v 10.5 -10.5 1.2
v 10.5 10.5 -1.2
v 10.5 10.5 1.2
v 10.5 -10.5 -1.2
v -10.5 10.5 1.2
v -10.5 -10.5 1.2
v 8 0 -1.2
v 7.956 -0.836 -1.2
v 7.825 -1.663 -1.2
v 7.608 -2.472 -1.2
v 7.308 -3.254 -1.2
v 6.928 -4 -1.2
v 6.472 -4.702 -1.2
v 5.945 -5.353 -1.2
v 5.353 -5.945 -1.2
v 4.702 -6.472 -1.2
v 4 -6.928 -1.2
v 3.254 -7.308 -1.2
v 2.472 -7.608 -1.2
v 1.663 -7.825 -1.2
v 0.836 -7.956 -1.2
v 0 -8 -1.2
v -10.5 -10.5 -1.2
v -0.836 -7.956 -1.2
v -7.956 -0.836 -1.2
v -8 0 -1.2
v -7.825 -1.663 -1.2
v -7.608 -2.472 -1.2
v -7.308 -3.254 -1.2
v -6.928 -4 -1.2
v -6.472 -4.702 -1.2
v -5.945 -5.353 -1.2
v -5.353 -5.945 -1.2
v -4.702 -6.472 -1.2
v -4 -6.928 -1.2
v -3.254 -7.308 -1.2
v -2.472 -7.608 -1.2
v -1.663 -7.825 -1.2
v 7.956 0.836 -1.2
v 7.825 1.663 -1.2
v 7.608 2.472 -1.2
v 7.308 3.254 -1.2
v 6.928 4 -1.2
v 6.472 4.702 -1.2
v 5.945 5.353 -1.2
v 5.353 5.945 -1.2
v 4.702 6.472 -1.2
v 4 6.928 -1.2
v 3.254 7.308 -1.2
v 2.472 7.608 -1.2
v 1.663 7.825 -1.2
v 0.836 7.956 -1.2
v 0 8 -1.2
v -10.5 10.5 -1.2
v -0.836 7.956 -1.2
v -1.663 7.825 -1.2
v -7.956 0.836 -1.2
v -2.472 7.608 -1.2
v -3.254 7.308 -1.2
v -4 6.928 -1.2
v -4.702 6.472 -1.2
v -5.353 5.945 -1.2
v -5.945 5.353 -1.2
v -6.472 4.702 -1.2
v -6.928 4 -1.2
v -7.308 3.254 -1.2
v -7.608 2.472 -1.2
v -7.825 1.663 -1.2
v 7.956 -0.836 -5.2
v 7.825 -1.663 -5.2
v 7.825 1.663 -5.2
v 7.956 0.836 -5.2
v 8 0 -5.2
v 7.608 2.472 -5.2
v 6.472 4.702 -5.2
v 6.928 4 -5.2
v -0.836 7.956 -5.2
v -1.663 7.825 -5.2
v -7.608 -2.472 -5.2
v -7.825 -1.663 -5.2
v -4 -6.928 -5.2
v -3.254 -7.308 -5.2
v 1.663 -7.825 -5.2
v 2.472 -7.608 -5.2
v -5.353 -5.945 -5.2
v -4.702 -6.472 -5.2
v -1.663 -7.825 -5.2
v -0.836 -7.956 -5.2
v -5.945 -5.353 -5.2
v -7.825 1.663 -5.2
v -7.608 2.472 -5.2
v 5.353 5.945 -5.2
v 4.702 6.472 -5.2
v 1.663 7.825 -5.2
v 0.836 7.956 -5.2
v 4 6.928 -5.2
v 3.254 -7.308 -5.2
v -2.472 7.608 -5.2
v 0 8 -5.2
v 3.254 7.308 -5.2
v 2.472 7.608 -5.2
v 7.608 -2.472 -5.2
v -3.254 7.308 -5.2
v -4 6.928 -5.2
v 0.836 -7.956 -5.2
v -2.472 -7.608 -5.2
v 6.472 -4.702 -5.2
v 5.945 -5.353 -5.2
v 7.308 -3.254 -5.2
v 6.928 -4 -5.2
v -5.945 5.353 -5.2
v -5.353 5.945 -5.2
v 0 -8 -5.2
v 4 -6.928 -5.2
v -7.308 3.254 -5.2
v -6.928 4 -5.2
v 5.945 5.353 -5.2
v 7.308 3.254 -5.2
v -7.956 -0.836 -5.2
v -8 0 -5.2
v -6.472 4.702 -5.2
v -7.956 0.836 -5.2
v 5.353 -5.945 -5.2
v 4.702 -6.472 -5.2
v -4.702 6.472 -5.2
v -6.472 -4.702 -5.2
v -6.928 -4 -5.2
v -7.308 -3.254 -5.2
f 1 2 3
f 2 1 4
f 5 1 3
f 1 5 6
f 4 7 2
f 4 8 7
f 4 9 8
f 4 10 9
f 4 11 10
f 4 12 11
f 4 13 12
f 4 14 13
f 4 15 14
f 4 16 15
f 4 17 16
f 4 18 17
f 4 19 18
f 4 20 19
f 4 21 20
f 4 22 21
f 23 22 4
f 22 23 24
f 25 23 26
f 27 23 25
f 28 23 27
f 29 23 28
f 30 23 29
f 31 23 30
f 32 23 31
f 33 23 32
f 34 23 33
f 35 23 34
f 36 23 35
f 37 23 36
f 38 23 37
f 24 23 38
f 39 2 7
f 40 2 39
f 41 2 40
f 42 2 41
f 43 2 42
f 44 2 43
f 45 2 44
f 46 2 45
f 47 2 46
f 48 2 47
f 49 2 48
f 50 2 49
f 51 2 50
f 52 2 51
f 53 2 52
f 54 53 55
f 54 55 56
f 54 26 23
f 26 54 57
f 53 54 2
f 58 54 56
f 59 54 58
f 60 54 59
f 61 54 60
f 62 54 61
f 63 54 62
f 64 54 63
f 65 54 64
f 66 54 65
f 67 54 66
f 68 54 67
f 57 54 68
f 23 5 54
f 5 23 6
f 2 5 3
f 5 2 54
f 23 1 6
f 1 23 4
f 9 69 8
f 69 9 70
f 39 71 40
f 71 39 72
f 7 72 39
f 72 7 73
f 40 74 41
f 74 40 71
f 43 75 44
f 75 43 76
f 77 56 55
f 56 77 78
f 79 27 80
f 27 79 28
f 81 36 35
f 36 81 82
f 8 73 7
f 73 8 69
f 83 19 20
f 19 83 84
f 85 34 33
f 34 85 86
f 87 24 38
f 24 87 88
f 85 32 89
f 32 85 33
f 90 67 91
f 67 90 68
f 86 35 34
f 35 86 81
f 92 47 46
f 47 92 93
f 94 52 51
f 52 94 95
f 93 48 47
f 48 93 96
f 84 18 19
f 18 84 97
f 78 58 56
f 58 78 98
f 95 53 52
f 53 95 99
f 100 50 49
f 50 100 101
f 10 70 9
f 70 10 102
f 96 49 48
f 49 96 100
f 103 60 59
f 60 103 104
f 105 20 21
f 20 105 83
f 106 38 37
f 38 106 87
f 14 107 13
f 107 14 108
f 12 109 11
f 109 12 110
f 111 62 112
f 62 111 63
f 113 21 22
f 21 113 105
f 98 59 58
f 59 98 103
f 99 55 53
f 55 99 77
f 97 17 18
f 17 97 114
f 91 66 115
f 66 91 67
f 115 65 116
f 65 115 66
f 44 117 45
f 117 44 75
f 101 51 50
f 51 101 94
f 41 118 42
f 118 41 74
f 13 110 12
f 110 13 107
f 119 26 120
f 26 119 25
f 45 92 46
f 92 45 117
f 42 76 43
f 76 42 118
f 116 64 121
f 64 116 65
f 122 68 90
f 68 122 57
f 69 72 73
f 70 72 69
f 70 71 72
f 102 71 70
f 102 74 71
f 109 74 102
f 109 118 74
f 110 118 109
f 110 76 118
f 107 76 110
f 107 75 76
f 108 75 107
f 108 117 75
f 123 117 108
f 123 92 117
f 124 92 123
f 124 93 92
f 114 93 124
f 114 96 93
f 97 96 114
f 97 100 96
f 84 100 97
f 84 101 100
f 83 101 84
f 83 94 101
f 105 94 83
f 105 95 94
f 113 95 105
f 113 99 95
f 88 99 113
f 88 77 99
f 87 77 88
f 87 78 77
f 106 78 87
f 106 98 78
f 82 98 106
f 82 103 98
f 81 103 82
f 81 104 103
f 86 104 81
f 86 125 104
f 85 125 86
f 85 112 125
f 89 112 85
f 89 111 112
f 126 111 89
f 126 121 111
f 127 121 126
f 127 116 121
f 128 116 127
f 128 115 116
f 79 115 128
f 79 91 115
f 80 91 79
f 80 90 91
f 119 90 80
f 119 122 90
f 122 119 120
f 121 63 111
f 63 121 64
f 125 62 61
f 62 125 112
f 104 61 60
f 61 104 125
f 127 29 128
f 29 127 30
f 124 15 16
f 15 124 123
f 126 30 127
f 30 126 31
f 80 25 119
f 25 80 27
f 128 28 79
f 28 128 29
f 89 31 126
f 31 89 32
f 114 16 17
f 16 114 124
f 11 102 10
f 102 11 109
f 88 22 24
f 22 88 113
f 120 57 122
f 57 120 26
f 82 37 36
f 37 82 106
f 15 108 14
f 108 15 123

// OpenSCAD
// Press-fit end cap for 20 mm extrusion.
$fn = 60;
eps = 0.02;
profile = 20;
cap_t = 2.4;
wall = 2;
pin_d = profile - 2 * wall;
pin_l = 4;
union() {
    cube([profile + 1, profile + 1, cap_t], center = true);
    translate([0, 0, -cap_t / 2 - pin_l]) cylinder(d = pin_d, h = pin_l + eps);
}
